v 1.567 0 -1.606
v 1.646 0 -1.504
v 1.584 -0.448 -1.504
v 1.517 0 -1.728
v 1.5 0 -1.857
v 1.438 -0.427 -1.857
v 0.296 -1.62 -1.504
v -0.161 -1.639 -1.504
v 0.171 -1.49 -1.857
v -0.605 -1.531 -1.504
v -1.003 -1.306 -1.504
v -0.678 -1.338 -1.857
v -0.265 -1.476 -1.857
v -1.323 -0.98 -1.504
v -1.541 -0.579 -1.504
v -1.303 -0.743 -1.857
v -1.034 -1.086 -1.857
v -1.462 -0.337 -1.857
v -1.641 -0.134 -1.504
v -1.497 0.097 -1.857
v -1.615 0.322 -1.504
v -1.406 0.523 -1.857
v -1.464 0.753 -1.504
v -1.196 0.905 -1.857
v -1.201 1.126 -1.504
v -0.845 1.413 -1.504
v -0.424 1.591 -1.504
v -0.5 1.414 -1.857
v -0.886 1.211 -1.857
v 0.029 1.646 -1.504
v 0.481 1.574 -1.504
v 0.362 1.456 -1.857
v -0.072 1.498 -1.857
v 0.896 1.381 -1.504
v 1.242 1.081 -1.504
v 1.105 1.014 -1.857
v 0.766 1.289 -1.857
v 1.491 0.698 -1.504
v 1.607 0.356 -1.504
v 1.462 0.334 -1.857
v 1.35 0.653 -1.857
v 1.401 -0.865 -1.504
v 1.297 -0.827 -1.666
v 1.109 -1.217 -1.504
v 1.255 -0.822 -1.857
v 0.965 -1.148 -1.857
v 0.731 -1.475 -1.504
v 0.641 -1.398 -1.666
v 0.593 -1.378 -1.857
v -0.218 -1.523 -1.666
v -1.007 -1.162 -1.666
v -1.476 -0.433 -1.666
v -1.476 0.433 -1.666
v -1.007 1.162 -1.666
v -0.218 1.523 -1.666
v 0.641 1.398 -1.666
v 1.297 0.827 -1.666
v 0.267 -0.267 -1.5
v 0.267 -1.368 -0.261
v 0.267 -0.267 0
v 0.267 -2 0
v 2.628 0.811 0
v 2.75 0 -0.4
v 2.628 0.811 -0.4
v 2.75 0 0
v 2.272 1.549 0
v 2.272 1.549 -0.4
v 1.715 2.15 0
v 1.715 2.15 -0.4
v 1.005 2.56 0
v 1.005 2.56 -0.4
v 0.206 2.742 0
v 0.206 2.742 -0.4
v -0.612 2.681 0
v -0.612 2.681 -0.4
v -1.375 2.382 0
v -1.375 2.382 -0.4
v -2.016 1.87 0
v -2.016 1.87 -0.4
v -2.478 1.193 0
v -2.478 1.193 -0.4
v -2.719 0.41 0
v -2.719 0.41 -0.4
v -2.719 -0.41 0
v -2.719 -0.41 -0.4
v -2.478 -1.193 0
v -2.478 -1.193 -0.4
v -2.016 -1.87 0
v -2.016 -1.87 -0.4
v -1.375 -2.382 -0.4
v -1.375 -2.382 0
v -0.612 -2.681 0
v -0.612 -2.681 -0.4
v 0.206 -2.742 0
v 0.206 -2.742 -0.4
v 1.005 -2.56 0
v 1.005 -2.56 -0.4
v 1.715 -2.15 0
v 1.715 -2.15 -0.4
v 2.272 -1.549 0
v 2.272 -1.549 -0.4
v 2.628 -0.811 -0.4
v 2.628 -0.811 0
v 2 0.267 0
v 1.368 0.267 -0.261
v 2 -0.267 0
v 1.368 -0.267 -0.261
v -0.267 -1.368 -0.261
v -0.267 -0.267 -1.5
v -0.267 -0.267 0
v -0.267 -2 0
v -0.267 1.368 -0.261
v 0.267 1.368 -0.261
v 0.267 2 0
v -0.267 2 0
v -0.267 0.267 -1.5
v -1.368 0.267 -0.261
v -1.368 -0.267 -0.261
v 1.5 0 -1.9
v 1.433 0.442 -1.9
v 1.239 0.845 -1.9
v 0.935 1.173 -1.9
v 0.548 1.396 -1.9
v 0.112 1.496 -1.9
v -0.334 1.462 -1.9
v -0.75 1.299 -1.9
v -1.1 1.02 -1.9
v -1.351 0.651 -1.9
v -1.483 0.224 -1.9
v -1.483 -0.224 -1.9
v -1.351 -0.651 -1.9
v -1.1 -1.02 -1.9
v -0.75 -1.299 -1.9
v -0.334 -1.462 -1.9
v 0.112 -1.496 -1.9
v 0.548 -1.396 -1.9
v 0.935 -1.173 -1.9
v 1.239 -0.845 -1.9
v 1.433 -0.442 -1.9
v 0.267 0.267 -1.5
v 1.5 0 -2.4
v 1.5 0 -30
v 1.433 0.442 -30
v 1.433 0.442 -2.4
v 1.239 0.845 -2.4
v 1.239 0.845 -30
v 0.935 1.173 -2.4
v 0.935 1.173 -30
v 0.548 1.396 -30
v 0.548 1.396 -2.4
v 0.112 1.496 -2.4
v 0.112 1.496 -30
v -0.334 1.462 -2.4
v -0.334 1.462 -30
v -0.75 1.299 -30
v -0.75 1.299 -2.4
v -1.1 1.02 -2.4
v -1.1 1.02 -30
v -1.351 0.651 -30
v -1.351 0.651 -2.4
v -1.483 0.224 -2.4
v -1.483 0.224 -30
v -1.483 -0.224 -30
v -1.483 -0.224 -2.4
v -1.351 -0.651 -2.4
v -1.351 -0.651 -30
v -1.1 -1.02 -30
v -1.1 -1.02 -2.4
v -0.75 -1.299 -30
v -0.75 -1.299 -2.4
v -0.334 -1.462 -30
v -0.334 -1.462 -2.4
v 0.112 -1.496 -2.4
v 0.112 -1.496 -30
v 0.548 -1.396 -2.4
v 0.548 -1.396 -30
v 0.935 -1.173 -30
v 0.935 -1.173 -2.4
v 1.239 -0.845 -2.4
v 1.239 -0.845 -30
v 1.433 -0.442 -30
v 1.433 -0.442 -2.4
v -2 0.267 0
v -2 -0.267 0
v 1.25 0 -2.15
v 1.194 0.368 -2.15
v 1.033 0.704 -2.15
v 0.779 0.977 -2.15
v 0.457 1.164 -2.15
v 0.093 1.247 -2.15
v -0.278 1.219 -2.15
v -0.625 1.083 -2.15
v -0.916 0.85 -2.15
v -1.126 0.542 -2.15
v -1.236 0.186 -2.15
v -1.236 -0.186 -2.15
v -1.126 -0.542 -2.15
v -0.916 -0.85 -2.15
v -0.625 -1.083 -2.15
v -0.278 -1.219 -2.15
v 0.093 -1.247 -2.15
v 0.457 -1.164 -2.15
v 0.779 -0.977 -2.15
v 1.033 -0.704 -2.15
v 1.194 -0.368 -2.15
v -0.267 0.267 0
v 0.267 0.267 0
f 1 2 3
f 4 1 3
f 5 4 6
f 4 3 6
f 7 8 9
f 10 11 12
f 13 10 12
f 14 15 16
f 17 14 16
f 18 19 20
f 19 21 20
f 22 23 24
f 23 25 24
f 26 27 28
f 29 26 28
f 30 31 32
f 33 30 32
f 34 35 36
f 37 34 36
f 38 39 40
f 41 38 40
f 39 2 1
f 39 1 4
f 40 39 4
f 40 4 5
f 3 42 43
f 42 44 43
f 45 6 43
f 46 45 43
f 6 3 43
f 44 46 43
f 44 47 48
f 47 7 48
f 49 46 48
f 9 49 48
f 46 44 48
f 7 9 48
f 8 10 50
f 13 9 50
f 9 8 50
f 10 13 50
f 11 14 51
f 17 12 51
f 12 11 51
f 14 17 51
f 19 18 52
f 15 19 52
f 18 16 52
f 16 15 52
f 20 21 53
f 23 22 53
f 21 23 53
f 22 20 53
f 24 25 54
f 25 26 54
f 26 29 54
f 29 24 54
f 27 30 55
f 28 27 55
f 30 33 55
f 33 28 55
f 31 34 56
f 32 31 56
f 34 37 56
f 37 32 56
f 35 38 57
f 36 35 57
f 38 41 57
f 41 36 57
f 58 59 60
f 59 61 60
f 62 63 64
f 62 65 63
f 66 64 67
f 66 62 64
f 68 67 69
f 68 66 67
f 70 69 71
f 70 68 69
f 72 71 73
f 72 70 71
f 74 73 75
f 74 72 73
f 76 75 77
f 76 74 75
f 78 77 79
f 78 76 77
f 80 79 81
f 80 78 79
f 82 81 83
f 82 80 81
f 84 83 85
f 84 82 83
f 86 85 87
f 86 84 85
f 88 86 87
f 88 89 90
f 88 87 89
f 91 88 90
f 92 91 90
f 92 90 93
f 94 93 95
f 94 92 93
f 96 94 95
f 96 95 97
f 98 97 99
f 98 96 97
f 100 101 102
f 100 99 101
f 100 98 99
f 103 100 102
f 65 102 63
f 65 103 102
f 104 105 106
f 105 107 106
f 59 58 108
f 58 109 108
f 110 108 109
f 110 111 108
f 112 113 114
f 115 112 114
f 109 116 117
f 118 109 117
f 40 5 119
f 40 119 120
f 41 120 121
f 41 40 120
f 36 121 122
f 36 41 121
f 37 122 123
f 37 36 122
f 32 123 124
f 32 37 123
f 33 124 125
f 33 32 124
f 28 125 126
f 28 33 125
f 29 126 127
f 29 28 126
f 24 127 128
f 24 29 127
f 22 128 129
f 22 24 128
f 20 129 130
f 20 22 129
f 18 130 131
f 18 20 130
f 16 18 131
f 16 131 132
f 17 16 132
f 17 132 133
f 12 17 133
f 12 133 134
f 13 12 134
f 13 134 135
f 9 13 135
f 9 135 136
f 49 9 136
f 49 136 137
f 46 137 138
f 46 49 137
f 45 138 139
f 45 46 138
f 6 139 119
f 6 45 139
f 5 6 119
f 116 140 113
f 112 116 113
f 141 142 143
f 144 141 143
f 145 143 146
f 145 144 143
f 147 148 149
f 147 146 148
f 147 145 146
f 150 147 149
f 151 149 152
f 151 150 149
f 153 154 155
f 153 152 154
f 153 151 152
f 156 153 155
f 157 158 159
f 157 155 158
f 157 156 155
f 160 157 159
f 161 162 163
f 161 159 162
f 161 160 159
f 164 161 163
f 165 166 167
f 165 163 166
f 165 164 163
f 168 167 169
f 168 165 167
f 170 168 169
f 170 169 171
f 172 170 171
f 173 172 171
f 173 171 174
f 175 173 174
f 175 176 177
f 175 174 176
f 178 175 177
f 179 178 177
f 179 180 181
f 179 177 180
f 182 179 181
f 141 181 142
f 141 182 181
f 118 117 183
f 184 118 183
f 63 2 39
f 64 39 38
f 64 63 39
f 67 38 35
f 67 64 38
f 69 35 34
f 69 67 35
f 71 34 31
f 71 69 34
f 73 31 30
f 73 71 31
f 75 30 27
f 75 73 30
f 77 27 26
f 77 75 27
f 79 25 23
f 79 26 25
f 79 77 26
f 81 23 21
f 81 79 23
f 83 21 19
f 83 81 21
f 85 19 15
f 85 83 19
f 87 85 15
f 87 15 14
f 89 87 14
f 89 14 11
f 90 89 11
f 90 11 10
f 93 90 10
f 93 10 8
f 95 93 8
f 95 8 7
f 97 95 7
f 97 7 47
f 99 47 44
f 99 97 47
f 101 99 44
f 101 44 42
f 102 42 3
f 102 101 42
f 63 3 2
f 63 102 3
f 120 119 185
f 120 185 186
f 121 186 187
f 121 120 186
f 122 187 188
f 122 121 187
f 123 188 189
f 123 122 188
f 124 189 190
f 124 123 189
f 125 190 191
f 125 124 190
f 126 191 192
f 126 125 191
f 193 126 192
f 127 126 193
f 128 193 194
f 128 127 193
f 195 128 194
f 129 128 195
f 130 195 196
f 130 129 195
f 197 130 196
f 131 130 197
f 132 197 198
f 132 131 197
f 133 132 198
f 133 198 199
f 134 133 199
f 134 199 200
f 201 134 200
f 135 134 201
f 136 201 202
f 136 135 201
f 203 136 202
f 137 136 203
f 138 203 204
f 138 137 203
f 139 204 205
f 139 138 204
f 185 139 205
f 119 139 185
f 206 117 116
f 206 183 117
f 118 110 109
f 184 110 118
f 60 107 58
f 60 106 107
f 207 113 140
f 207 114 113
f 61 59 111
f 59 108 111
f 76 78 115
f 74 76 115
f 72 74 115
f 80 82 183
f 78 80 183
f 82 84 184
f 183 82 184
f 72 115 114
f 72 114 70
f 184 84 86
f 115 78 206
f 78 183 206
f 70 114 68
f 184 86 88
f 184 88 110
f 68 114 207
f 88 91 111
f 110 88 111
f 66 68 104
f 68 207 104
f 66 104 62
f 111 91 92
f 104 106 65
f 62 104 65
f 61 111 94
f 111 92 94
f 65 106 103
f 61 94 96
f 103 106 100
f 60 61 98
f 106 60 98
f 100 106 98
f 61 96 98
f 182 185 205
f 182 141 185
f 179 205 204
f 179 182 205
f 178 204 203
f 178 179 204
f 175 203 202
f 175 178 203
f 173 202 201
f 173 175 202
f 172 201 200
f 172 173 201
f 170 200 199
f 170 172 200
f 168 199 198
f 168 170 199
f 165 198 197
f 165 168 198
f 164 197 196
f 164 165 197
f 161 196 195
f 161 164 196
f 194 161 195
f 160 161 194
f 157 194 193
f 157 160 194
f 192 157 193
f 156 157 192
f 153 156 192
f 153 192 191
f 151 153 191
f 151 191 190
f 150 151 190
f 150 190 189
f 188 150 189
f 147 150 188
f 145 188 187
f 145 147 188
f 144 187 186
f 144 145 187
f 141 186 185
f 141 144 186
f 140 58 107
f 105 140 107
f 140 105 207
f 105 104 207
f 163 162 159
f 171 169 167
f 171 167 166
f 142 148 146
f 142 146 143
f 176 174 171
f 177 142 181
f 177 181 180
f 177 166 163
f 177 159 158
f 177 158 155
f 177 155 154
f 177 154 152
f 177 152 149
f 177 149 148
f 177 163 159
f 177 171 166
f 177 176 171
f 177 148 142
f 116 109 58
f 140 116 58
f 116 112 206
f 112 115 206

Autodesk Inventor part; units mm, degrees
ref_plane "YZ Plane" through (0, 0, 0) normal (1, 0, 0) x (0, 1, 0)
sketch "Esquisse1" plane through (0, 0, 0) normal (0, 1, 0) x (-1, 0, 0)
  point P0 (0, 0)
sketch "Esquisse2" plane through (0, 0, 0) normal (0, 0, 1) x (1, 0, 0)
  point P0 (0, 0)
sketch "Esquisse3" plane through (0, 0, 0) normal (0, 0, 1) x (1, 0, 0)
  point P0 (0, 0)
sketch "Esquisse4" plane through (0, 0, 0) normal (0, 1, 0) x (-1, 0, 0)
  line L0 (-2.75, 0) -> (0, 0)
  line L1 (-2.75, -0.4) -> (-2.75, 0)
  line L2 (-1.5, -1.65) -> (-2.75, -0.4)
  line L3 (-1.5, -1.9) -> (-1.5, -1.65)
  line L4 (-1.25, -2.15) -> (-1.5, -1.9)
  line L5 (-1.5, -2.4) -> (-1.25, -2.15)
  line L6 (-1.5, -30) -> (-1.5, -2.4)
  line L7 (0, 0) -> (0, -30)
  line L8 (0, 3.3392) -> (0, -10.7) construction
  line L9 (0, 3.3392) -> (0, -10.7)
  line L10 (0, -36.6678) -> (0, 10.0071) projected
  line L11 (-1.5, -30) -> (0, -30)
  line L12 (0.55, 0) -> (-3.3, 0) projected
  dimension "d3" = 2.75
  dimension "d5" = 0.25
  dimension "d7" = 0.25
  dimension "d9" = 0.25
  dimension "d11" = 1.65
  dimension "d13" = 135
  dimension "d17" = 1.25
  dimension "d19" = 0
  dimension "d51" = 1.5
  dimension "d52" = 30
revolve "Révolution1" add sketch "Esquisse4" angle 360 about axis through (0, 0, 3.3392) along (0, 0, -1)
sketch "Esquisse5" plane through (0, 0, 0) normal (0, 1, 0) x (-1, 0, 0)
  line L0 (-1.6, 0) -> (0, 0)
  line L1 (-0.2667, -1.5) -> (-1.6, 0)
  line L2 (0, -1.5) -> (-0.2667, -1.5)
  line L3 (0, 0) -> (0, -1.5)
  line L4 (-1.5, -1.65) -> (1.5, -1.65) construction
  line L5 (-2.75, 0) -> (2.75, 0) projected
  line L6 (0, -1.98) -> (0, 0.33) projected
  dimension "d22" = 1.6
  dimension "d24" = 0.2667
  dimension "d26" = 1.5
extrude "Extrusion1" cut sketch "Esquisse5" along normal mid plane 0.5333
pattern_circular "RéseauPolaire1" count 4 over 360 about axis through (0, 0, 0) along (0, 0, 1) of "Extrusion1"
sketch "Esquisse7" plane through (0, 0, 0) normal (0, 1, 0) x (-1, 0, 0)
  line L0 (0, -0.825) -> (-2, 0)
  line L1 (0, 0) -> (0, -0.825)
  line L2 (-2, 0) -> (0, 0)
  line L3 (-1.5, -1.65) -> (1.5, -1.65) construction
  line L4 (0, -1.98) -> (0, 0.33) projected
  line L5 (-2.75, 0) -> (2.75, 0) projected
  dimension "d33" = 2
  dimension "d35" = 0.825
extrude "Extrusion2" cut sketch "Esquisse7" along normal mid plane 0.5333
pattern_circular "RéseauPolaire2" count 4 over 360 about axis through (0, 0, 0) along (0, 0, 1) of "Extrusion2"
fillet "Congé1" radius 0.5 1 edges at (-1.5, 0, -1.65)
thread "Filetage1" size "M3x0.5" class "6g" standard "ISO Metric profile" full length
ref_plane "MSC_PF1" through (0, 0, 0) normal (1, 0, 0) x (0, 1, 0)
ref_plane "MSC_PT1" through (0, 0, 0) normal (0, 0, -1) x (-1, 0, 0)
equation "\"d3\" = 0.5 * Dh"
equation "\"d5\" = msp_x"
equation "\"d7\" = ParA"
equation "\"d9\" = msp_x"
equation "\"d11\" = ParK"
equation "\"d17\" = 0.5 * msp_mdtds"
equation "\"d51\" = 0.5 * NND"
equation "\"d52\" = NLG"
equation "\"d22\" = 0.5 * M"
equation "\"d24\" = 0.0833333 * M"
equation "\"d26\" = 0.909091 * ParK"
equation "\"d27\" = 0.166667 * M"
equation "\"d33\" = 0.625 * M"
equation "\"d35\" = 0.5 * ParK"
equation "\"d36\" = 0.166667 * M"
equation "\"d41\" = 2 * msp_x"
equation "\"PTC\" = 0.5"
equation "\"NLG\" = 30"
equation "\"ParK\" = 1.65"
equation "\"NND\" = 3"
equation "\"M\" = 3.2"
equation "\"msp_mdtds\" = NND - PTC"
equation "\"Dh\" = 5.5"
equation "\"msp_x\" = 0.5 * PTC"
equation "\"ParA\" = 0.5 * PTC"
equation "\"r\" = 0.8"
equation "\"THREADDIA\" = NND"
equation "\"TEMPLATE\" = 1.2345"
properties part number "NF EN ISO 7046-2 H - M3x30 - 8.8 - H1" material "Acier inoxydable 440C"
